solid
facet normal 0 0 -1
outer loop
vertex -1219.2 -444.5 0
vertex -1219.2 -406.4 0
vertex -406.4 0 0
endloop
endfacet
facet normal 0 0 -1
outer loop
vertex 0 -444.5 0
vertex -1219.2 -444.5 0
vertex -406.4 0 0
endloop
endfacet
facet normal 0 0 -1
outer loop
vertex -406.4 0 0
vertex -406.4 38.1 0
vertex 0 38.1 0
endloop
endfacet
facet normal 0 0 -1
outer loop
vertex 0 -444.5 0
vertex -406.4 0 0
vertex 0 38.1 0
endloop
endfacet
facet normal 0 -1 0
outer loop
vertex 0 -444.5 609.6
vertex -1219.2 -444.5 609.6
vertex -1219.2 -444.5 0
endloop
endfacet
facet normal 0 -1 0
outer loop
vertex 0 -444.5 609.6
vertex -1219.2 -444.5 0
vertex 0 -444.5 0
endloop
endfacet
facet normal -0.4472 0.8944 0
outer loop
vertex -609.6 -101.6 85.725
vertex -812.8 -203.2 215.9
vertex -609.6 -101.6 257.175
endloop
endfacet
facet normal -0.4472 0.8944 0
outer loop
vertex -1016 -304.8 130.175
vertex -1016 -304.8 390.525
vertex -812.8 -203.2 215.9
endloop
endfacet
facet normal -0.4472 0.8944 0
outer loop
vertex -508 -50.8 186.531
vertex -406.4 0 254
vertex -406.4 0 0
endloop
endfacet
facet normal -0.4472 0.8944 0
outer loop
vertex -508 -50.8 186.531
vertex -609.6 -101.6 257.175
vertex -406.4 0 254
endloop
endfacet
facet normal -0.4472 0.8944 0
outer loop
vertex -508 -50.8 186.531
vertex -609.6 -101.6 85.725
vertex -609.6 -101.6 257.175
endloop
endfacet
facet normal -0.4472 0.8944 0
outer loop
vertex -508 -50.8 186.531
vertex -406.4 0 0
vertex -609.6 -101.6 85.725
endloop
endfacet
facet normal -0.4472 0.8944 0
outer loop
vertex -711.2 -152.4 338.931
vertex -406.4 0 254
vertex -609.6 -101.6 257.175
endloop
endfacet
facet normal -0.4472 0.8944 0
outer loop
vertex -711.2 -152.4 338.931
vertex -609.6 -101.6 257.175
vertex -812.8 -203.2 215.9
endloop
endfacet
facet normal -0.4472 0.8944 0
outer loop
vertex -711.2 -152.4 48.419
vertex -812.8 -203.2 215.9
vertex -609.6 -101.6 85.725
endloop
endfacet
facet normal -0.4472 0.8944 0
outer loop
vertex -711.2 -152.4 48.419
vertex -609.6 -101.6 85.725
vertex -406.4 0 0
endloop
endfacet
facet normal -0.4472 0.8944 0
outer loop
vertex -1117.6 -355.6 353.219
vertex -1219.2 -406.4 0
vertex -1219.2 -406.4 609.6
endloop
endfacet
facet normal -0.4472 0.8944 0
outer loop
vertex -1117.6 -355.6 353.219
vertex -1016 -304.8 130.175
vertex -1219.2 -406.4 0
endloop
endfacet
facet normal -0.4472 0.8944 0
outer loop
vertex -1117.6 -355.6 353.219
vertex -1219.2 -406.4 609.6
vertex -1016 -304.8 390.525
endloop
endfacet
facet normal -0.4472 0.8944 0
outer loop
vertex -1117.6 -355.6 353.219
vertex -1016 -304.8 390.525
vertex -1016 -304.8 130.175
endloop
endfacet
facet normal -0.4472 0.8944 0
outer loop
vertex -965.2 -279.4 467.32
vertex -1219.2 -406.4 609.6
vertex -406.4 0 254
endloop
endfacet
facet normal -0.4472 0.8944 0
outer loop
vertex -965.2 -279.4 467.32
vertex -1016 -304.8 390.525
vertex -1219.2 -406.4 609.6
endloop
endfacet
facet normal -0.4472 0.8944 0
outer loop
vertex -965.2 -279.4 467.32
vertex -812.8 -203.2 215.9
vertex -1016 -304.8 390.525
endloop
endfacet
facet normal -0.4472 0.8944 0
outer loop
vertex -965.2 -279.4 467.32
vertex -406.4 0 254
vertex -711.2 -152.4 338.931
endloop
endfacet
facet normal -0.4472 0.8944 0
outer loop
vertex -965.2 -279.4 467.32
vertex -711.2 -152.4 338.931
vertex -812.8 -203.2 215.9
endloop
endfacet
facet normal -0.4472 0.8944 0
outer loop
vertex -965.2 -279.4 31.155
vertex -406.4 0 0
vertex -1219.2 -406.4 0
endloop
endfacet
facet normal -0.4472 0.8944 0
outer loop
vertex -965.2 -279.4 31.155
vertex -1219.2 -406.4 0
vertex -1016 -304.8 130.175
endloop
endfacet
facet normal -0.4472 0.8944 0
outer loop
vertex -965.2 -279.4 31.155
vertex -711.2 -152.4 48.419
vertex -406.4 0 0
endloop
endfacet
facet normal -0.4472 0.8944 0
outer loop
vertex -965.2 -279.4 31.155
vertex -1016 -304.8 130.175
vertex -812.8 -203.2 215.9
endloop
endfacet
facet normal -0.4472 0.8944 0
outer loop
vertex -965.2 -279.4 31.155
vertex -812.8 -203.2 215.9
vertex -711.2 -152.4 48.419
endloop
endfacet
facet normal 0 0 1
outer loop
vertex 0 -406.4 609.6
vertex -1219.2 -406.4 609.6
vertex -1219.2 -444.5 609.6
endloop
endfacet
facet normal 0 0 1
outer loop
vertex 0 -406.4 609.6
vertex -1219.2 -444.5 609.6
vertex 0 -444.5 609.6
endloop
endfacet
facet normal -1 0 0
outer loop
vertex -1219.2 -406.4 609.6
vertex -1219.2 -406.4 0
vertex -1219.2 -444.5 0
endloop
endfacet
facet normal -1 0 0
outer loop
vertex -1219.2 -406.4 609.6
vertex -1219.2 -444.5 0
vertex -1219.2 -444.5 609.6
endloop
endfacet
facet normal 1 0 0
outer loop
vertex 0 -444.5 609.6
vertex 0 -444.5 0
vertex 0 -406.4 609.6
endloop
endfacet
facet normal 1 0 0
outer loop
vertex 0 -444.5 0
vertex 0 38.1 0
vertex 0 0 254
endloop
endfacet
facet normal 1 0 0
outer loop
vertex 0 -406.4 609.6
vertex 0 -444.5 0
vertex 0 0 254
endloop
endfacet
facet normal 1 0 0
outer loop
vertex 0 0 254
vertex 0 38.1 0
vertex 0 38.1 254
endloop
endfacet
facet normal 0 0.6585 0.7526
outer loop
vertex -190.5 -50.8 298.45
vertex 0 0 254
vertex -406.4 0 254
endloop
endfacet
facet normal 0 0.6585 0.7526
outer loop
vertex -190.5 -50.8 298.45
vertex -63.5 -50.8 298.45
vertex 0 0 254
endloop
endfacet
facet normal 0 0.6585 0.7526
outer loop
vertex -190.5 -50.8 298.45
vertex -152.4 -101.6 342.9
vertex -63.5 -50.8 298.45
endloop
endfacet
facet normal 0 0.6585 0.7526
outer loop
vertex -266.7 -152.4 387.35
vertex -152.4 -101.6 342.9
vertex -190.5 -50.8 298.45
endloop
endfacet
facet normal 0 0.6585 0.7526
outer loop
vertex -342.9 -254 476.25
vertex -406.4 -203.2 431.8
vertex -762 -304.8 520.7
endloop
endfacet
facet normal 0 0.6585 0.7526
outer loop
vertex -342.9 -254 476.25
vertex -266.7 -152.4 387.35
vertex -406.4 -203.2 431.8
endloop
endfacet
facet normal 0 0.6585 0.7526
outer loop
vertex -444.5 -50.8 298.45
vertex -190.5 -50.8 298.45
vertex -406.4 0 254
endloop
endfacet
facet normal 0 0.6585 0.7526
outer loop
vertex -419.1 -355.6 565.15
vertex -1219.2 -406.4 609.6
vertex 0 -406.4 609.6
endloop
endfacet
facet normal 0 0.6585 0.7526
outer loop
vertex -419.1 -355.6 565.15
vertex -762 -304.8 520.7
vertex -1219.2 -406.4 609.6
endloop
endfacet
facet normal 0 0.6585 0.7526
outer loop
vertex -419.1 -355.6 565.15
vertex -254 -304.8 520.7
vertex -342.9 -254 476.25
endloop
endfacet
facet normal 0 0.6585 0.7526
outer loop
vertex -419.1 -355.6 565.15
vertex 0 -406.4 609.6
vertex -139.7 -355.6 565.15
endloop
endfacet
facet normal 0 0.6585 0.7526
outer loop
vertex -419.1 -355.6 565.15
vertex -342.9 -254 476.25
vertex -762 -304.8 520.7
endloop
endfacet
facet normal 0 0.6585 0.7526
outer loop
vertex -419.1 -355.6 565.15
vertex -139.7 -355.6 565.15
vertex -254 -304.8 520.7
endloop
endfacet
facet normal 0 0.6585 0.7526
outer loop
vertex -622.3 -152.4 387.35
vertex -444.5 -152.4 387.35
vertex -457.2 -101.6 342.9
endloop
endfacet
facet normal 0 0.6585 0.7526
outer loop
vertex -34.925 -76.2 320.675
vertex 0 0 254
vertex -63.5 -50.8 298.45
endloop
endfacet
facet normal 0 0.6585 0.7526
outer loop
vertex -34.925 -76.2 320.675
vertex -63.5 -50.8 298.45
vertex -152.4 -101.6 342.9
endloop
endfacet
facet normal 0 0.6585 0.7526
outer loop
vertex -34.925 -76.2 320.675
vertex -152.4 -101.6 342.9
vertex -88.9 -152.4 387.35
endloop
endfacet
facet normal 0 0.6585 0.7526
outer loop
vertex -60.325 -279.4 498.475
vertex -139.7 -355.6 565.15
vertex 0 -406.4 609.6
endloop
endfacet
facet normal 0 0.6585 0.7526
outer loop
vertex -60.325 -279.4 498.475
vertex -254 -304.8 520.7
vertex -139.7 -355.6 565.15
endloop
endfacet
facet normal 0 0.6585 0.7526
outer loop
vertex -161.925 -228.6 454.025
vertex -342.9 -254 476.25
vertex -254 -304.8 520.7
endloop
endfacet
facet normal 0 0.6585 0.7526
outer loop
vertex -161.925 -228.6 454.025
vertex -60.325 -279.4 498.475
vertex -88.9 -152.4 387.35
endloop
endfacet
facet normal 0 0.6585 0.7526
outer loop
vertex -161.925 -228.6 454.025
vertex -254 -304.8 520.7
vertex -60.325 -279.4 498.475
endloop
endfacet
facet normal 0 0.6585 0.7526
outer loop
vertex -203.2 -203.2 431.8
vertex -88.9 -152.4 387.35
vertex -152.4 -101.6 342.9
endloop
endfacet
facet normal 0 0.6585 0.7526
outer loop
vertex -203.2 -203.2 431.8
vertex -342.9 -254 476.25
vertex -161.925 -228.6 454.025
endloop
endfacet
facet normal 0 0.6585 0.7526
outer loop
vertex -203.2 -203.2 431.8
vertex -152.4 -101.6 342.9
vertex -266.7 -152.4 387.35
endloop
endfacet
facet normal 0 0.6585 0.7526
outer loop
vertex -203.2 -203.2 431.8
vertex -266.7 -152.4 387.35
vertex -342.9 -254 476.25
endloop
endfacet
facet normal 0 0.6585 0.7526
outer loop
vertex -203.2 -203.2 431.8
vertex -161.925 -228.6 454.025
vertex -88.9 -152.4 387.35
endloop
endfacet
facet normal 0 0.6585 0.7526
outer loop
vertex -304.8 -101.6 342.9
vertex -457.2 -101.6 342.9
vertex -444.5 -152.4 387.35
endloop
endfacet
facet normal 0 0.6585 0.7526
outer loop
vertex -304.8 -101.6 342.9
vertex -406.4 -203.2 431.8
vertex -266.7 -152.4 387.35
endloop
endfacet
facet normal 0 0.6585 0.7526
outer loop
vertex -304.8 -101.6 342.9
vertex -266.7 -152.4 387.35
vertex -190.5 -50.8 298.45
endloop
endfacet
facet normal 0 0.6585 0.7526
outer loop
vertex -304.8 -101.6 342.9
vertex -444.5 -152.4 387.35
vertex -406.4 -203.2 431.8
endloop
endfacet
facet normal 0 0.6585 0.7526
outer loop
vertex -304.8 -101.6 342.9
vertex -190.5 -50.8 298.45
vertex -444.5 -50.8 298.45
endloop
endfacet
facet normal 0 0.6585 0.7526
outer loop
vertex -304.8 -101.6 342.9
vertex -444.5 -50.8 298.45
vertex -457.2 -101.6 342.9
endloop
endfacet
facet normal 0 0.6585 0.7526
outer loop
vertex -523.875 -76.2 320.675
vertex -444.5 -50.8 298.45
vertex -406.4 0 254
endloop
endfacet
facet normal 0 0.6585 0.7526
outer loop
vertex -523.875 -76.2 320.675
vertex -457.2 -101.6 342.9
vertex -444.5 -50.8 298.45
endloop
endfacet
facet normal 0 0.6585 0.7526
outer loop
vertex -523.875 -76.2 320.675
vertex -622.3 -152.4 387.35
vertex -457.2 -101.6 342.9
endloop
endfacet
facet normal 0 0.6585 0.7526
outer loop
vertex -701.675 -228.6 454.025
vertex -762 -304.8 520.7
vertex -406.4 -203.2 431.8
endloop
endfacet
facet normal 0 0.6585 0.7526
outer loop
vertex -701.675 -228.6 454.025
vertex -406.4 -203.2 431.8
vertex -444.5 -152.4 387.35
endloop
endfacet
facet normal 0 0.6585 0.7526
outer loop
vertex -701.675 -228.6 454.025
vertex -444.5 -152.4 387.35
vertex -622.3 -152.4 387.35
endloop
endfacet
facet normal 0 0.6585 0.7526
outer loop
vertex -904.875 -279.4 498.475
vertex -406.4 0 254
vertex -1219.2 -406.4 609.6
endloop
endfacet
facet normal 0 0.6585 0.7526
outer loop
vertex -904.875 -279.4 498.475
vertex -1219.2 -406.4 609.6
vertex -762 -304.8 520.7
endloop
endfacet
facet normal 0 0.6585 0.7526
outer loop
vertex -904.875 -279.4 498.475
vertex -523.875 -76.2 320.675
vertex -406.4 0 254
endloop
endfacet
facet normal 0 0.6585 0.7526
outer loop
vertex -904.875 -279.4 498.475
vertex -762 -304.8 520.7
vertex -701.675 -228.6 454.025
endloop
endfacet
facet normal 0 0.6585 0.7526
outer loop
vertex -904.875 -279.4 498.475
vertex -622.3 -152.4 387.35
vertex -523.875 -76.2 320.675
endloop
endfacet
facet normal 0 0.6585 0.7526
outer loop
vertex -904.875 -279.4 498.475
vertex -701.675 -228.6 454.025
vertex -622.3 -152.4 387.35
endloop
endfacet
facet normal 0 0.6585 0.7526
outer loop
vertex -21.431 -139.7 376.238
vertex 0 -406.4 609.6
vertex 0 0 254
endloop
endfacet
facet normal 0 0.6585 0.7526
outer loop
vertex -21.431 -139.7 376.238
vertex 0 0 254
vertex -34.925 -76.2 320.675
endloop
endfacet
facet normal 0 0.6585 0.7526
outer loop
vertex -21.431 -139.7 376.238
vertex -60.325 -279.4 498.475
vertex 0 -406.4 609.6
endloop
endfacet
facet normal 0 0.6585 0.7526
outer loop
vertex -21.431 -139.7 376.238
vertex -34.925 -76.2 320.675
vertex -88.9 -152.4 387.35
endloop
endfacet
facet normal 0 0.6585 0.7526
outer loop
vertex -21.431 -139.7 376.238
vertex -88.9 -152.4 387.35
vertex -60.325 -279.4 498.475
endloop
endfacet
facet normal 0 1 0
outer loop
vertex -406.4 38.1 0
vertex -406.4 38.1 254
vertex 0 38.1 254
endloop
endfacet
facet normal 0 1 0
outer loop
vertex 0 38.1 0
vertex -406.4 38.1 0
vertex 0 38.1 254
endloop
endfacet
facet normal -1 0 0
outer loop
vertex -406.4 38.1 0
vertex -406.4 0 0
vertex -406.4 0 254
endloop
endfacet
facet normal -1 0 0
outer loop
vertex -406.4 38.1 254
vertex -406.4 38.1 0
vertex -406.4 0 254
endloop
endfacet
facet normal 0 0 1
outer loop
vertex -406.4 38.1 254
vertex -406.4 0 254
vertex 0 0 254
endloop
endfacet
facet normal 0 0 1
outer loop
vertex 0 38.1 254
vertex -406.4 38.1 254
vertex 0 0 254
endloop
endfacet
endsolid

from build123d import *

# Parameters (mm, degrees)
F0_W     = 406.4
F0_H     = 254
F2_W     = 1219.2
F2_H     = 609.6
F4_DEPTH = 38.1
F5_DEPTH = 38.1


with BuildPart() as f3:
    # F0 (on Front) → F3 section 0
    with BuildSketch(Plane.XZ):
        with Locations((-203.2, 127)):
            Rectangle(F0_W, F0_H)
    # F2 (on offset) → F3 section 1
    with BuildSketch(Plane.XZ.offset(406.4)):
        with Locations((-609.6, 304.8)):
            Rectangle(F2_W, F2_H)
    loft()

    # F4 (add): a face of the model
    f4_faces = [f3.faces().sort_by_distance(p)[0] for p in [
        (-203.2, 0, 127),
    ]]
    extrude(f4_faces, amount=F4_DEPTH)

    # F5 (add): a face of the model
    f5_faces = [f3.faces().sort_by_distance(p)[0] for p in [
        (-609.6, -406.4, 304.8),
    ]]
    extrude(f5_faces, amount=F5_DEPTH)


solid = f3.part
